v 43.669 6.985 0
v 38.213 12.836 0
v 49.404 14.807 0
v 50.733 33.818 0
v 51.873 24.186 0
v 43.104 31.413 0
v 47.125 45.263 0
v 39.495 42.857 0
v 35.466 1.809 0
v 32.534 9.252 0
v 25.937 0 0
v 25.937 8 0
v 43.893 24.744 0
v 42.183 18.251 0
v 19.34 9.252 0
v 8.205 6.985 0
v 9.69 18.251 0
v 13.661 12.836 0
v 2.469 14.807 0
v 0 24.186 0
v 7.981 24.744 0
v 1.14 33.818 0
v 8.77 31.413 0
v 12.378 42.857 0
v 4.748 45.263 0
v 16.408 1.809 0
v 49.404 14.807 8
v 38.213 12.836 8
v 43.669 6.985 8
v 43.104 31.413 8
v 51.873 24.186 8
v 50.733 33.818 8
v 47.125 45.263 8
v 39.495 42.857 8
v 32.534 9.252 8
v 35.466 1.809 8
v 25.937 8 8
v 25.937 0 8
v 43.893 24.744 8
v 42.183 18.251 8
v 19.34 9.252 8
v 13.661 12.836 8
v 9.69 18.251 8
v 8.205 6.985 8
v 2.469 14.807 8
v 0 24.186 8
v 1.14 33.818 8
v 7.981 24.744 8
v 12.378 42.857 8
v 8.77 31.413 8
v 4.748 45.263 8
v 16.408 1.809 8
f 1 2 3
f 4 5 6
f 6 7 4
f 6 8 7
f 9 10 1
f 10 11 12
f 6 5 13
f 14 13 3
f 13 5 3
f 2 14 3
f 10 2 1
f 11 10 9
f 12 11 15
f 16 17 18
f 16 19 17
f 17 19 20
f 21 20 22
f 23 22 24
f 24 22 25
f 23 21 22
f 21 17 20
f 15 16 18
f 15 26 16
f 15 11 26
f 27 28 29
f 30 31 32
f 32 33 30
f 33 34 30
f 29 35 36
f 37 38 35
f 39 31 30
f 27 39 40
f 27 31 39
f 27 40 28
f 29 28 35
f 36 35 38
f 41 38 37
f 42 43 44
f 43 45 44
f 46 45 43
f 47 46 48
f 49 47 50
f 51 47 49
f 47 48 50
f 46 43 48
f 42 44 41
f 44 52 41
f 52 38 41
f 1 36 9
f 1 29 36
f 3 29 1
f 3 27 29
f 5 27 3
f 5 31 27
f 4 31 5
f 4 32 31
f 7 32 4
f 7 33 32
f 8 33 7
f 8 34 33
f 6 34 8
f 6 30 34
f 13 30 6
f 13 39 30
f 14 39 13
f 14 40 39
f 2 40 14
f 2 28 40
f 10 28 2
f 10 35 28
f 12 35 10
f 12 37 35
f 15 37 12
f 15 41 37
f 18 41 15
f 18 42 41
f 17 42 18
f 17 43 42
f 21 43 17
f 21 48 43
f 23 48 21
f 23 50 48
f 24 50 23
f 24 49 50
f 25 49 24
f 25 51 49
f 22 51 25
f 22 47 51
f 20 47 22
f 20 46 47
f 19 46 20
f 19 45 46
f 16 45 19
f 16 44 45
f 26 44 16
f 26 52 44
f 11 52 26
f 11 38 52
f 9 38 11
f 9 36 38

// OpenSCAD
$fn = 32;

// ----------------------------------------------------------------------
// Clip blank: omega clip, 8 mm thick
// ----------------------------------------------------------------------

// --- parameters (mm) ---
profile_height = 8;       // extrusion height
profile_points = 26;      // points of the closed outline

profile = [[1.14, 33.818], [0, 24.186], [2.469, 14.807], [8.205, 6.985], [16.408, 1.809], [25.937, 0], [35.466, 1.809], [43.669, 6.985], [49.404, 14.807], [51.873, 24.186], [50.733, 33.818], [47.125, 45.263], [39.495, 42.857], [43.104, 31.413], [43.893, 24.744], [42.183, 18.251], [38.213, 12.836], [32.534, 9.252], [25.937, 8], [19.34, 9.252], [13.661, 12.836], [9.69, 18.251], [7.981, 24.744], [8.77, 31.413], [12.378, 42.857], [4.748, 45.263]];  // single closed polygon, 26 points, counter clockwise

// --- the one profile operation ---
linear_extrude(height = profile_height) polygon(points = profile);
